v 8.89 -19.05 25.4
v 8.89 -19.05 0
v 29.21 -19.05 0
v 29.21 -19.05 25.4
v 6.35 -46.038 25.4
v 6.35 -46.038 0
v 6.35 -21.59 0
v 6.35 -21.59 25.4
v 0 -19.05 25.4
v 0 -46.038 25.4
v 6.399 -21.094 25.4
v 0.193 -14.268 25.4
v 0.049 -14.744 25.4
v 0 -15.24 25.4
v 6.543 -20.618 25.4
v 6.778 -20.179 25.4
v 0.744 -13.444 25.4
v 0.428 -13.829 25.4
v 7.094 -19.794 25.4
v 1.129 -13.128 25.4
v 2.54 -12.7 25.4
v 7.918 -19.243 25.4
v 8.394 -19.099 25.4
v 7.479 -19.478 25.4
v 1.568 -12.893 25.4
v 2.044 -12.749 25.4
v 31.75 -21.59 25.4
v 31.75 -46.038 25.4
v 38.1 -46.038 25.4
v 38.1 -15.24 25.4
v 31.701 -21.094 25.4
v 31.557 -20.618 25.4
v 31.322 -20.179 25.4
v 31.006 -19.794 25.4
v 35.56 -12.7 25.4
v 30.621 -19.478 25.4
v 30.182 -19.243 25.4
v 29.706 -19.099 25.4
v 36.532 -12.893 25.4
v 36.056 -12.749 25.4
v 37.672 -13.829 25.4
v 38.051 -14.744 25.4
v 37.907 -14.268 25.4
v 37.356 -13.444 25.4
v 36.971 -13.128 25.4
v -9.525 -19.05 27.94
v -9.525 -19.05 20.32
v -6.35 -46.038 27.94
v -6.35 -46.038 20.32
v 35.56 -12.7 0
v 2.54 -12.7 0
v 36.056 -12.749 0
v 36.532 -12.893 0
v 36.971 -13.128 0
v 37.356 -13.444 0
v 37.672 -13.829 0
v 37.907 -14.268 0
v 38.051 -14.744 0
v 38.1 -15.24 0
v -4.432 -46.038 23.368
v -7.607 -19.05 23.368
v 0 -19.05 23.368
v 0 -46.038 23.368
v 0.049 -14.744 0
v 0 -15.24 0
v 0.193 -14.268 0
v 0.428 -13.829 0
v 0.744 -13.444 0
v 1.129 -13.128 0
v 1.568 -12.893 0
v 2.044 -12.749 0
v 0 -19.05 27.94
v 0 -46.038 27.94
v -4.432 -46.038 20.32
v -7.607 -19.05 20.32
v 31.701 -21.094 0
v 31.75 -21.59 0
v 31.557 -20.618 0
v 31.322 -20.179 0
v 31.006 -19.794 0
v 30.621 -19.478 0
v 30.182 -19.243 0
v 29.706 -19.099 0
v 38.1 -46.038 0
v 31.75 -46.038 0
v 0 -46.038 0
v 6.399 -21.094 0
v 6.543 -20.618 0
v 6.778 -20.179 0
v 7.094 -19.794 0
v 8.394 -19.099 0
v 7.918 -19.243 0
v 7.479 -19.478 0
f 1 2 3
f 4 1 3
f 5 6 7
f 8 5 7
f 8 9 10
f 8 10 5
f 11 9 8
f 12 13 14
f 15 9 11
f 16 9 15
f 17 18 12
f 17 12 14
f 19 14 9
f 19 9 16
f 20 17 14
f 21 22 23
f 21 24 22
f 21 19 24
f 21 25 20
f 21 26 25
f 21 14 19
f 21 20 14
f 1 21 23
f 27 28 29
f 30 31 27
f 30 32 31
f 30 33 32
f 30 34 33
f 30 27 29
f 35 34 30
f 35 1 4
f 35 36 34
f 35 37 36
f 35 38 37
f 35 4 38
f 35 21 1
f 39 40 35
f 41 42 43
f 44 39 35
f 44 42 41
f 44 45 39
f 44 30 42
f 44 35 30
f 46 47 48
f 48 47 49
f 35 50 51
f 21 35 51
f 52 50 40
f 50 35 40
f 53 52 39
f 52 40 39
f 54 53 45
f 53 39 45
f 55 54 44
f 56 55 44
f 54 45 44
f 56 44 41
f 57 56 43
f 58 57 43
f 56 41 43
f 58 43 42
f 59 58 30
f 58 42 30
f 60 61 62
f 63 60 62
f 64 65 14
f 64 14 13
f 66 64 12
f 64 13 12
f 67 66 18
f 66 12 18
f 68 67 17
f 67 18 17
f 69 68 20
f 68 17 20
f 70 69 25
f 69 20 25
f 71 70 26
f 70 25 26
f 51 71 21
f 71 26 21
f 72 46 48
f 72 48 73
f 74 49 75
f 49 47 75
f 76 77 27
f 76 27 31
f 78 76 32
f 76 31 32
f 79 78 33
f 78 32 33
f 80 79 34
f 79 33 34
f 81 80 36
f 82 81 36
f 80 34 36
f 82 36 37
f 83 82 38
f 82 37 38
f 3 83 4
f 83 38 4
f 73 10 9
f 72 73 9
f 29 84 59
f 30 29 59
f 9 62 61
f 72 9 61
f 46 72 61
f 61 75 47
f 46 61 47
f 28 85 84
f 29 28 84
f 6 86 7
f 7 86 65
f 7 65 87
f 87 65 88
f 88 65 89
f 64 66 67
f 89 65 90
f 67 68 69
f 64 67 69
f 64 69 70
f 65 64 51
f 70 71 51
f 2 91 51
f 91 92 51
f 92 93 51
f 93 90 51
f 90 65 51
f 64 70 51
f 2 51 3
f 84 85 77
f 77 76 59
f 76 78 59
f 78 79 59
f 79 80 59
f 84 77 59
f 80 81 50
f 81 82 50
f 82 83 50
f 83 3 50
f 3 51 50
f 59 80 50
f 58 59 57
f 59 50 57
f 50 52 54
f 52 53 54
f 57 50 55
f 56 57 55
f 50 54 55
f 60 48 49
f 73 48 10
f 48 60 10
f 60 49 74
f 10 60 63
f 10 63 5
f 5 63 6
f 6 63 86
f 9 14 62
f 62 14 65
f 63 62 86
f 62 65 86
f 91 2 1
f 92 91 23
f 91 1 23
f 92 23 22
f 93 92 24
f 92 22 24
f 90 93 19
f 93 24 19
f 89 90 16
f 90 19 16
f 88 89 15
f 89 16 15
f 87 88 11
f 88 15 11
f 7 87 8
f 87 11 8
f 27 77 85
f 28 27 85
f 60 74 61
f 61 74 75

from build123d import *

# Parameters (mm, degrees)
F1_DEPTH      = 25.4
F3_DEPTH      = 5.08
F3_DEPTH_BACK = 2.54
F4_R          = 2.54
F6_DEPTH      = 3.048


with BuildPart() as f1:
    # F0 (on Top) → F1 (new body)
    with BuildSketch(Plane.XY):
        Polygon((6.35, -19.05), (31.75, -19.05), (31.75, -46.0375), (38.1, -46.0375), (38.1, -12.7), (0, -12.7), (0, -46.0375), (6.35, -46.0375), align=None)
    extrude(amount=F1_DEPTH)

    # F2 (on face) → F3 (join, two sides)
    with BuildSketch(Plane.XY.offset(25.4)) as f3_sk:
        Polygon((0, -46.0375), (0, -19.05), (-9.525, -19.05), (-6.35, -46.0375), align=None)
    extrude(amount=-F3_DEPTH)
    extrude(f3_sk.sketch, amount=F3_DEPTH_BACK)

    # F4
    f4_edges = [f1.edges().sort_by_distance(p)[0] for p in [
        (6.35, -19.05, 12.7),
        (31.75, -19.05, 12.7),
        (38.1, -12.7, 12.7),
        (0, -12.7, 12.7),
    ]]
    fillet(f4_edges, radius=F4_R)

    # F5 (on face) → F6 (cut)
    with BuildSketch(Plane(origin=(0, 0, 20.32), x_dir=(1, 0, 0), z_dir=(0, 0, -1))):
        Polygon((0, 46.0375), (-4.4318619133, 46.0375), (-7.6068619133, 19.05), (0, 19.05), align=None)
    extrude(amount=-F6_DEPTH, mode=Mode.SUBTRACT)


solid = f1.part
